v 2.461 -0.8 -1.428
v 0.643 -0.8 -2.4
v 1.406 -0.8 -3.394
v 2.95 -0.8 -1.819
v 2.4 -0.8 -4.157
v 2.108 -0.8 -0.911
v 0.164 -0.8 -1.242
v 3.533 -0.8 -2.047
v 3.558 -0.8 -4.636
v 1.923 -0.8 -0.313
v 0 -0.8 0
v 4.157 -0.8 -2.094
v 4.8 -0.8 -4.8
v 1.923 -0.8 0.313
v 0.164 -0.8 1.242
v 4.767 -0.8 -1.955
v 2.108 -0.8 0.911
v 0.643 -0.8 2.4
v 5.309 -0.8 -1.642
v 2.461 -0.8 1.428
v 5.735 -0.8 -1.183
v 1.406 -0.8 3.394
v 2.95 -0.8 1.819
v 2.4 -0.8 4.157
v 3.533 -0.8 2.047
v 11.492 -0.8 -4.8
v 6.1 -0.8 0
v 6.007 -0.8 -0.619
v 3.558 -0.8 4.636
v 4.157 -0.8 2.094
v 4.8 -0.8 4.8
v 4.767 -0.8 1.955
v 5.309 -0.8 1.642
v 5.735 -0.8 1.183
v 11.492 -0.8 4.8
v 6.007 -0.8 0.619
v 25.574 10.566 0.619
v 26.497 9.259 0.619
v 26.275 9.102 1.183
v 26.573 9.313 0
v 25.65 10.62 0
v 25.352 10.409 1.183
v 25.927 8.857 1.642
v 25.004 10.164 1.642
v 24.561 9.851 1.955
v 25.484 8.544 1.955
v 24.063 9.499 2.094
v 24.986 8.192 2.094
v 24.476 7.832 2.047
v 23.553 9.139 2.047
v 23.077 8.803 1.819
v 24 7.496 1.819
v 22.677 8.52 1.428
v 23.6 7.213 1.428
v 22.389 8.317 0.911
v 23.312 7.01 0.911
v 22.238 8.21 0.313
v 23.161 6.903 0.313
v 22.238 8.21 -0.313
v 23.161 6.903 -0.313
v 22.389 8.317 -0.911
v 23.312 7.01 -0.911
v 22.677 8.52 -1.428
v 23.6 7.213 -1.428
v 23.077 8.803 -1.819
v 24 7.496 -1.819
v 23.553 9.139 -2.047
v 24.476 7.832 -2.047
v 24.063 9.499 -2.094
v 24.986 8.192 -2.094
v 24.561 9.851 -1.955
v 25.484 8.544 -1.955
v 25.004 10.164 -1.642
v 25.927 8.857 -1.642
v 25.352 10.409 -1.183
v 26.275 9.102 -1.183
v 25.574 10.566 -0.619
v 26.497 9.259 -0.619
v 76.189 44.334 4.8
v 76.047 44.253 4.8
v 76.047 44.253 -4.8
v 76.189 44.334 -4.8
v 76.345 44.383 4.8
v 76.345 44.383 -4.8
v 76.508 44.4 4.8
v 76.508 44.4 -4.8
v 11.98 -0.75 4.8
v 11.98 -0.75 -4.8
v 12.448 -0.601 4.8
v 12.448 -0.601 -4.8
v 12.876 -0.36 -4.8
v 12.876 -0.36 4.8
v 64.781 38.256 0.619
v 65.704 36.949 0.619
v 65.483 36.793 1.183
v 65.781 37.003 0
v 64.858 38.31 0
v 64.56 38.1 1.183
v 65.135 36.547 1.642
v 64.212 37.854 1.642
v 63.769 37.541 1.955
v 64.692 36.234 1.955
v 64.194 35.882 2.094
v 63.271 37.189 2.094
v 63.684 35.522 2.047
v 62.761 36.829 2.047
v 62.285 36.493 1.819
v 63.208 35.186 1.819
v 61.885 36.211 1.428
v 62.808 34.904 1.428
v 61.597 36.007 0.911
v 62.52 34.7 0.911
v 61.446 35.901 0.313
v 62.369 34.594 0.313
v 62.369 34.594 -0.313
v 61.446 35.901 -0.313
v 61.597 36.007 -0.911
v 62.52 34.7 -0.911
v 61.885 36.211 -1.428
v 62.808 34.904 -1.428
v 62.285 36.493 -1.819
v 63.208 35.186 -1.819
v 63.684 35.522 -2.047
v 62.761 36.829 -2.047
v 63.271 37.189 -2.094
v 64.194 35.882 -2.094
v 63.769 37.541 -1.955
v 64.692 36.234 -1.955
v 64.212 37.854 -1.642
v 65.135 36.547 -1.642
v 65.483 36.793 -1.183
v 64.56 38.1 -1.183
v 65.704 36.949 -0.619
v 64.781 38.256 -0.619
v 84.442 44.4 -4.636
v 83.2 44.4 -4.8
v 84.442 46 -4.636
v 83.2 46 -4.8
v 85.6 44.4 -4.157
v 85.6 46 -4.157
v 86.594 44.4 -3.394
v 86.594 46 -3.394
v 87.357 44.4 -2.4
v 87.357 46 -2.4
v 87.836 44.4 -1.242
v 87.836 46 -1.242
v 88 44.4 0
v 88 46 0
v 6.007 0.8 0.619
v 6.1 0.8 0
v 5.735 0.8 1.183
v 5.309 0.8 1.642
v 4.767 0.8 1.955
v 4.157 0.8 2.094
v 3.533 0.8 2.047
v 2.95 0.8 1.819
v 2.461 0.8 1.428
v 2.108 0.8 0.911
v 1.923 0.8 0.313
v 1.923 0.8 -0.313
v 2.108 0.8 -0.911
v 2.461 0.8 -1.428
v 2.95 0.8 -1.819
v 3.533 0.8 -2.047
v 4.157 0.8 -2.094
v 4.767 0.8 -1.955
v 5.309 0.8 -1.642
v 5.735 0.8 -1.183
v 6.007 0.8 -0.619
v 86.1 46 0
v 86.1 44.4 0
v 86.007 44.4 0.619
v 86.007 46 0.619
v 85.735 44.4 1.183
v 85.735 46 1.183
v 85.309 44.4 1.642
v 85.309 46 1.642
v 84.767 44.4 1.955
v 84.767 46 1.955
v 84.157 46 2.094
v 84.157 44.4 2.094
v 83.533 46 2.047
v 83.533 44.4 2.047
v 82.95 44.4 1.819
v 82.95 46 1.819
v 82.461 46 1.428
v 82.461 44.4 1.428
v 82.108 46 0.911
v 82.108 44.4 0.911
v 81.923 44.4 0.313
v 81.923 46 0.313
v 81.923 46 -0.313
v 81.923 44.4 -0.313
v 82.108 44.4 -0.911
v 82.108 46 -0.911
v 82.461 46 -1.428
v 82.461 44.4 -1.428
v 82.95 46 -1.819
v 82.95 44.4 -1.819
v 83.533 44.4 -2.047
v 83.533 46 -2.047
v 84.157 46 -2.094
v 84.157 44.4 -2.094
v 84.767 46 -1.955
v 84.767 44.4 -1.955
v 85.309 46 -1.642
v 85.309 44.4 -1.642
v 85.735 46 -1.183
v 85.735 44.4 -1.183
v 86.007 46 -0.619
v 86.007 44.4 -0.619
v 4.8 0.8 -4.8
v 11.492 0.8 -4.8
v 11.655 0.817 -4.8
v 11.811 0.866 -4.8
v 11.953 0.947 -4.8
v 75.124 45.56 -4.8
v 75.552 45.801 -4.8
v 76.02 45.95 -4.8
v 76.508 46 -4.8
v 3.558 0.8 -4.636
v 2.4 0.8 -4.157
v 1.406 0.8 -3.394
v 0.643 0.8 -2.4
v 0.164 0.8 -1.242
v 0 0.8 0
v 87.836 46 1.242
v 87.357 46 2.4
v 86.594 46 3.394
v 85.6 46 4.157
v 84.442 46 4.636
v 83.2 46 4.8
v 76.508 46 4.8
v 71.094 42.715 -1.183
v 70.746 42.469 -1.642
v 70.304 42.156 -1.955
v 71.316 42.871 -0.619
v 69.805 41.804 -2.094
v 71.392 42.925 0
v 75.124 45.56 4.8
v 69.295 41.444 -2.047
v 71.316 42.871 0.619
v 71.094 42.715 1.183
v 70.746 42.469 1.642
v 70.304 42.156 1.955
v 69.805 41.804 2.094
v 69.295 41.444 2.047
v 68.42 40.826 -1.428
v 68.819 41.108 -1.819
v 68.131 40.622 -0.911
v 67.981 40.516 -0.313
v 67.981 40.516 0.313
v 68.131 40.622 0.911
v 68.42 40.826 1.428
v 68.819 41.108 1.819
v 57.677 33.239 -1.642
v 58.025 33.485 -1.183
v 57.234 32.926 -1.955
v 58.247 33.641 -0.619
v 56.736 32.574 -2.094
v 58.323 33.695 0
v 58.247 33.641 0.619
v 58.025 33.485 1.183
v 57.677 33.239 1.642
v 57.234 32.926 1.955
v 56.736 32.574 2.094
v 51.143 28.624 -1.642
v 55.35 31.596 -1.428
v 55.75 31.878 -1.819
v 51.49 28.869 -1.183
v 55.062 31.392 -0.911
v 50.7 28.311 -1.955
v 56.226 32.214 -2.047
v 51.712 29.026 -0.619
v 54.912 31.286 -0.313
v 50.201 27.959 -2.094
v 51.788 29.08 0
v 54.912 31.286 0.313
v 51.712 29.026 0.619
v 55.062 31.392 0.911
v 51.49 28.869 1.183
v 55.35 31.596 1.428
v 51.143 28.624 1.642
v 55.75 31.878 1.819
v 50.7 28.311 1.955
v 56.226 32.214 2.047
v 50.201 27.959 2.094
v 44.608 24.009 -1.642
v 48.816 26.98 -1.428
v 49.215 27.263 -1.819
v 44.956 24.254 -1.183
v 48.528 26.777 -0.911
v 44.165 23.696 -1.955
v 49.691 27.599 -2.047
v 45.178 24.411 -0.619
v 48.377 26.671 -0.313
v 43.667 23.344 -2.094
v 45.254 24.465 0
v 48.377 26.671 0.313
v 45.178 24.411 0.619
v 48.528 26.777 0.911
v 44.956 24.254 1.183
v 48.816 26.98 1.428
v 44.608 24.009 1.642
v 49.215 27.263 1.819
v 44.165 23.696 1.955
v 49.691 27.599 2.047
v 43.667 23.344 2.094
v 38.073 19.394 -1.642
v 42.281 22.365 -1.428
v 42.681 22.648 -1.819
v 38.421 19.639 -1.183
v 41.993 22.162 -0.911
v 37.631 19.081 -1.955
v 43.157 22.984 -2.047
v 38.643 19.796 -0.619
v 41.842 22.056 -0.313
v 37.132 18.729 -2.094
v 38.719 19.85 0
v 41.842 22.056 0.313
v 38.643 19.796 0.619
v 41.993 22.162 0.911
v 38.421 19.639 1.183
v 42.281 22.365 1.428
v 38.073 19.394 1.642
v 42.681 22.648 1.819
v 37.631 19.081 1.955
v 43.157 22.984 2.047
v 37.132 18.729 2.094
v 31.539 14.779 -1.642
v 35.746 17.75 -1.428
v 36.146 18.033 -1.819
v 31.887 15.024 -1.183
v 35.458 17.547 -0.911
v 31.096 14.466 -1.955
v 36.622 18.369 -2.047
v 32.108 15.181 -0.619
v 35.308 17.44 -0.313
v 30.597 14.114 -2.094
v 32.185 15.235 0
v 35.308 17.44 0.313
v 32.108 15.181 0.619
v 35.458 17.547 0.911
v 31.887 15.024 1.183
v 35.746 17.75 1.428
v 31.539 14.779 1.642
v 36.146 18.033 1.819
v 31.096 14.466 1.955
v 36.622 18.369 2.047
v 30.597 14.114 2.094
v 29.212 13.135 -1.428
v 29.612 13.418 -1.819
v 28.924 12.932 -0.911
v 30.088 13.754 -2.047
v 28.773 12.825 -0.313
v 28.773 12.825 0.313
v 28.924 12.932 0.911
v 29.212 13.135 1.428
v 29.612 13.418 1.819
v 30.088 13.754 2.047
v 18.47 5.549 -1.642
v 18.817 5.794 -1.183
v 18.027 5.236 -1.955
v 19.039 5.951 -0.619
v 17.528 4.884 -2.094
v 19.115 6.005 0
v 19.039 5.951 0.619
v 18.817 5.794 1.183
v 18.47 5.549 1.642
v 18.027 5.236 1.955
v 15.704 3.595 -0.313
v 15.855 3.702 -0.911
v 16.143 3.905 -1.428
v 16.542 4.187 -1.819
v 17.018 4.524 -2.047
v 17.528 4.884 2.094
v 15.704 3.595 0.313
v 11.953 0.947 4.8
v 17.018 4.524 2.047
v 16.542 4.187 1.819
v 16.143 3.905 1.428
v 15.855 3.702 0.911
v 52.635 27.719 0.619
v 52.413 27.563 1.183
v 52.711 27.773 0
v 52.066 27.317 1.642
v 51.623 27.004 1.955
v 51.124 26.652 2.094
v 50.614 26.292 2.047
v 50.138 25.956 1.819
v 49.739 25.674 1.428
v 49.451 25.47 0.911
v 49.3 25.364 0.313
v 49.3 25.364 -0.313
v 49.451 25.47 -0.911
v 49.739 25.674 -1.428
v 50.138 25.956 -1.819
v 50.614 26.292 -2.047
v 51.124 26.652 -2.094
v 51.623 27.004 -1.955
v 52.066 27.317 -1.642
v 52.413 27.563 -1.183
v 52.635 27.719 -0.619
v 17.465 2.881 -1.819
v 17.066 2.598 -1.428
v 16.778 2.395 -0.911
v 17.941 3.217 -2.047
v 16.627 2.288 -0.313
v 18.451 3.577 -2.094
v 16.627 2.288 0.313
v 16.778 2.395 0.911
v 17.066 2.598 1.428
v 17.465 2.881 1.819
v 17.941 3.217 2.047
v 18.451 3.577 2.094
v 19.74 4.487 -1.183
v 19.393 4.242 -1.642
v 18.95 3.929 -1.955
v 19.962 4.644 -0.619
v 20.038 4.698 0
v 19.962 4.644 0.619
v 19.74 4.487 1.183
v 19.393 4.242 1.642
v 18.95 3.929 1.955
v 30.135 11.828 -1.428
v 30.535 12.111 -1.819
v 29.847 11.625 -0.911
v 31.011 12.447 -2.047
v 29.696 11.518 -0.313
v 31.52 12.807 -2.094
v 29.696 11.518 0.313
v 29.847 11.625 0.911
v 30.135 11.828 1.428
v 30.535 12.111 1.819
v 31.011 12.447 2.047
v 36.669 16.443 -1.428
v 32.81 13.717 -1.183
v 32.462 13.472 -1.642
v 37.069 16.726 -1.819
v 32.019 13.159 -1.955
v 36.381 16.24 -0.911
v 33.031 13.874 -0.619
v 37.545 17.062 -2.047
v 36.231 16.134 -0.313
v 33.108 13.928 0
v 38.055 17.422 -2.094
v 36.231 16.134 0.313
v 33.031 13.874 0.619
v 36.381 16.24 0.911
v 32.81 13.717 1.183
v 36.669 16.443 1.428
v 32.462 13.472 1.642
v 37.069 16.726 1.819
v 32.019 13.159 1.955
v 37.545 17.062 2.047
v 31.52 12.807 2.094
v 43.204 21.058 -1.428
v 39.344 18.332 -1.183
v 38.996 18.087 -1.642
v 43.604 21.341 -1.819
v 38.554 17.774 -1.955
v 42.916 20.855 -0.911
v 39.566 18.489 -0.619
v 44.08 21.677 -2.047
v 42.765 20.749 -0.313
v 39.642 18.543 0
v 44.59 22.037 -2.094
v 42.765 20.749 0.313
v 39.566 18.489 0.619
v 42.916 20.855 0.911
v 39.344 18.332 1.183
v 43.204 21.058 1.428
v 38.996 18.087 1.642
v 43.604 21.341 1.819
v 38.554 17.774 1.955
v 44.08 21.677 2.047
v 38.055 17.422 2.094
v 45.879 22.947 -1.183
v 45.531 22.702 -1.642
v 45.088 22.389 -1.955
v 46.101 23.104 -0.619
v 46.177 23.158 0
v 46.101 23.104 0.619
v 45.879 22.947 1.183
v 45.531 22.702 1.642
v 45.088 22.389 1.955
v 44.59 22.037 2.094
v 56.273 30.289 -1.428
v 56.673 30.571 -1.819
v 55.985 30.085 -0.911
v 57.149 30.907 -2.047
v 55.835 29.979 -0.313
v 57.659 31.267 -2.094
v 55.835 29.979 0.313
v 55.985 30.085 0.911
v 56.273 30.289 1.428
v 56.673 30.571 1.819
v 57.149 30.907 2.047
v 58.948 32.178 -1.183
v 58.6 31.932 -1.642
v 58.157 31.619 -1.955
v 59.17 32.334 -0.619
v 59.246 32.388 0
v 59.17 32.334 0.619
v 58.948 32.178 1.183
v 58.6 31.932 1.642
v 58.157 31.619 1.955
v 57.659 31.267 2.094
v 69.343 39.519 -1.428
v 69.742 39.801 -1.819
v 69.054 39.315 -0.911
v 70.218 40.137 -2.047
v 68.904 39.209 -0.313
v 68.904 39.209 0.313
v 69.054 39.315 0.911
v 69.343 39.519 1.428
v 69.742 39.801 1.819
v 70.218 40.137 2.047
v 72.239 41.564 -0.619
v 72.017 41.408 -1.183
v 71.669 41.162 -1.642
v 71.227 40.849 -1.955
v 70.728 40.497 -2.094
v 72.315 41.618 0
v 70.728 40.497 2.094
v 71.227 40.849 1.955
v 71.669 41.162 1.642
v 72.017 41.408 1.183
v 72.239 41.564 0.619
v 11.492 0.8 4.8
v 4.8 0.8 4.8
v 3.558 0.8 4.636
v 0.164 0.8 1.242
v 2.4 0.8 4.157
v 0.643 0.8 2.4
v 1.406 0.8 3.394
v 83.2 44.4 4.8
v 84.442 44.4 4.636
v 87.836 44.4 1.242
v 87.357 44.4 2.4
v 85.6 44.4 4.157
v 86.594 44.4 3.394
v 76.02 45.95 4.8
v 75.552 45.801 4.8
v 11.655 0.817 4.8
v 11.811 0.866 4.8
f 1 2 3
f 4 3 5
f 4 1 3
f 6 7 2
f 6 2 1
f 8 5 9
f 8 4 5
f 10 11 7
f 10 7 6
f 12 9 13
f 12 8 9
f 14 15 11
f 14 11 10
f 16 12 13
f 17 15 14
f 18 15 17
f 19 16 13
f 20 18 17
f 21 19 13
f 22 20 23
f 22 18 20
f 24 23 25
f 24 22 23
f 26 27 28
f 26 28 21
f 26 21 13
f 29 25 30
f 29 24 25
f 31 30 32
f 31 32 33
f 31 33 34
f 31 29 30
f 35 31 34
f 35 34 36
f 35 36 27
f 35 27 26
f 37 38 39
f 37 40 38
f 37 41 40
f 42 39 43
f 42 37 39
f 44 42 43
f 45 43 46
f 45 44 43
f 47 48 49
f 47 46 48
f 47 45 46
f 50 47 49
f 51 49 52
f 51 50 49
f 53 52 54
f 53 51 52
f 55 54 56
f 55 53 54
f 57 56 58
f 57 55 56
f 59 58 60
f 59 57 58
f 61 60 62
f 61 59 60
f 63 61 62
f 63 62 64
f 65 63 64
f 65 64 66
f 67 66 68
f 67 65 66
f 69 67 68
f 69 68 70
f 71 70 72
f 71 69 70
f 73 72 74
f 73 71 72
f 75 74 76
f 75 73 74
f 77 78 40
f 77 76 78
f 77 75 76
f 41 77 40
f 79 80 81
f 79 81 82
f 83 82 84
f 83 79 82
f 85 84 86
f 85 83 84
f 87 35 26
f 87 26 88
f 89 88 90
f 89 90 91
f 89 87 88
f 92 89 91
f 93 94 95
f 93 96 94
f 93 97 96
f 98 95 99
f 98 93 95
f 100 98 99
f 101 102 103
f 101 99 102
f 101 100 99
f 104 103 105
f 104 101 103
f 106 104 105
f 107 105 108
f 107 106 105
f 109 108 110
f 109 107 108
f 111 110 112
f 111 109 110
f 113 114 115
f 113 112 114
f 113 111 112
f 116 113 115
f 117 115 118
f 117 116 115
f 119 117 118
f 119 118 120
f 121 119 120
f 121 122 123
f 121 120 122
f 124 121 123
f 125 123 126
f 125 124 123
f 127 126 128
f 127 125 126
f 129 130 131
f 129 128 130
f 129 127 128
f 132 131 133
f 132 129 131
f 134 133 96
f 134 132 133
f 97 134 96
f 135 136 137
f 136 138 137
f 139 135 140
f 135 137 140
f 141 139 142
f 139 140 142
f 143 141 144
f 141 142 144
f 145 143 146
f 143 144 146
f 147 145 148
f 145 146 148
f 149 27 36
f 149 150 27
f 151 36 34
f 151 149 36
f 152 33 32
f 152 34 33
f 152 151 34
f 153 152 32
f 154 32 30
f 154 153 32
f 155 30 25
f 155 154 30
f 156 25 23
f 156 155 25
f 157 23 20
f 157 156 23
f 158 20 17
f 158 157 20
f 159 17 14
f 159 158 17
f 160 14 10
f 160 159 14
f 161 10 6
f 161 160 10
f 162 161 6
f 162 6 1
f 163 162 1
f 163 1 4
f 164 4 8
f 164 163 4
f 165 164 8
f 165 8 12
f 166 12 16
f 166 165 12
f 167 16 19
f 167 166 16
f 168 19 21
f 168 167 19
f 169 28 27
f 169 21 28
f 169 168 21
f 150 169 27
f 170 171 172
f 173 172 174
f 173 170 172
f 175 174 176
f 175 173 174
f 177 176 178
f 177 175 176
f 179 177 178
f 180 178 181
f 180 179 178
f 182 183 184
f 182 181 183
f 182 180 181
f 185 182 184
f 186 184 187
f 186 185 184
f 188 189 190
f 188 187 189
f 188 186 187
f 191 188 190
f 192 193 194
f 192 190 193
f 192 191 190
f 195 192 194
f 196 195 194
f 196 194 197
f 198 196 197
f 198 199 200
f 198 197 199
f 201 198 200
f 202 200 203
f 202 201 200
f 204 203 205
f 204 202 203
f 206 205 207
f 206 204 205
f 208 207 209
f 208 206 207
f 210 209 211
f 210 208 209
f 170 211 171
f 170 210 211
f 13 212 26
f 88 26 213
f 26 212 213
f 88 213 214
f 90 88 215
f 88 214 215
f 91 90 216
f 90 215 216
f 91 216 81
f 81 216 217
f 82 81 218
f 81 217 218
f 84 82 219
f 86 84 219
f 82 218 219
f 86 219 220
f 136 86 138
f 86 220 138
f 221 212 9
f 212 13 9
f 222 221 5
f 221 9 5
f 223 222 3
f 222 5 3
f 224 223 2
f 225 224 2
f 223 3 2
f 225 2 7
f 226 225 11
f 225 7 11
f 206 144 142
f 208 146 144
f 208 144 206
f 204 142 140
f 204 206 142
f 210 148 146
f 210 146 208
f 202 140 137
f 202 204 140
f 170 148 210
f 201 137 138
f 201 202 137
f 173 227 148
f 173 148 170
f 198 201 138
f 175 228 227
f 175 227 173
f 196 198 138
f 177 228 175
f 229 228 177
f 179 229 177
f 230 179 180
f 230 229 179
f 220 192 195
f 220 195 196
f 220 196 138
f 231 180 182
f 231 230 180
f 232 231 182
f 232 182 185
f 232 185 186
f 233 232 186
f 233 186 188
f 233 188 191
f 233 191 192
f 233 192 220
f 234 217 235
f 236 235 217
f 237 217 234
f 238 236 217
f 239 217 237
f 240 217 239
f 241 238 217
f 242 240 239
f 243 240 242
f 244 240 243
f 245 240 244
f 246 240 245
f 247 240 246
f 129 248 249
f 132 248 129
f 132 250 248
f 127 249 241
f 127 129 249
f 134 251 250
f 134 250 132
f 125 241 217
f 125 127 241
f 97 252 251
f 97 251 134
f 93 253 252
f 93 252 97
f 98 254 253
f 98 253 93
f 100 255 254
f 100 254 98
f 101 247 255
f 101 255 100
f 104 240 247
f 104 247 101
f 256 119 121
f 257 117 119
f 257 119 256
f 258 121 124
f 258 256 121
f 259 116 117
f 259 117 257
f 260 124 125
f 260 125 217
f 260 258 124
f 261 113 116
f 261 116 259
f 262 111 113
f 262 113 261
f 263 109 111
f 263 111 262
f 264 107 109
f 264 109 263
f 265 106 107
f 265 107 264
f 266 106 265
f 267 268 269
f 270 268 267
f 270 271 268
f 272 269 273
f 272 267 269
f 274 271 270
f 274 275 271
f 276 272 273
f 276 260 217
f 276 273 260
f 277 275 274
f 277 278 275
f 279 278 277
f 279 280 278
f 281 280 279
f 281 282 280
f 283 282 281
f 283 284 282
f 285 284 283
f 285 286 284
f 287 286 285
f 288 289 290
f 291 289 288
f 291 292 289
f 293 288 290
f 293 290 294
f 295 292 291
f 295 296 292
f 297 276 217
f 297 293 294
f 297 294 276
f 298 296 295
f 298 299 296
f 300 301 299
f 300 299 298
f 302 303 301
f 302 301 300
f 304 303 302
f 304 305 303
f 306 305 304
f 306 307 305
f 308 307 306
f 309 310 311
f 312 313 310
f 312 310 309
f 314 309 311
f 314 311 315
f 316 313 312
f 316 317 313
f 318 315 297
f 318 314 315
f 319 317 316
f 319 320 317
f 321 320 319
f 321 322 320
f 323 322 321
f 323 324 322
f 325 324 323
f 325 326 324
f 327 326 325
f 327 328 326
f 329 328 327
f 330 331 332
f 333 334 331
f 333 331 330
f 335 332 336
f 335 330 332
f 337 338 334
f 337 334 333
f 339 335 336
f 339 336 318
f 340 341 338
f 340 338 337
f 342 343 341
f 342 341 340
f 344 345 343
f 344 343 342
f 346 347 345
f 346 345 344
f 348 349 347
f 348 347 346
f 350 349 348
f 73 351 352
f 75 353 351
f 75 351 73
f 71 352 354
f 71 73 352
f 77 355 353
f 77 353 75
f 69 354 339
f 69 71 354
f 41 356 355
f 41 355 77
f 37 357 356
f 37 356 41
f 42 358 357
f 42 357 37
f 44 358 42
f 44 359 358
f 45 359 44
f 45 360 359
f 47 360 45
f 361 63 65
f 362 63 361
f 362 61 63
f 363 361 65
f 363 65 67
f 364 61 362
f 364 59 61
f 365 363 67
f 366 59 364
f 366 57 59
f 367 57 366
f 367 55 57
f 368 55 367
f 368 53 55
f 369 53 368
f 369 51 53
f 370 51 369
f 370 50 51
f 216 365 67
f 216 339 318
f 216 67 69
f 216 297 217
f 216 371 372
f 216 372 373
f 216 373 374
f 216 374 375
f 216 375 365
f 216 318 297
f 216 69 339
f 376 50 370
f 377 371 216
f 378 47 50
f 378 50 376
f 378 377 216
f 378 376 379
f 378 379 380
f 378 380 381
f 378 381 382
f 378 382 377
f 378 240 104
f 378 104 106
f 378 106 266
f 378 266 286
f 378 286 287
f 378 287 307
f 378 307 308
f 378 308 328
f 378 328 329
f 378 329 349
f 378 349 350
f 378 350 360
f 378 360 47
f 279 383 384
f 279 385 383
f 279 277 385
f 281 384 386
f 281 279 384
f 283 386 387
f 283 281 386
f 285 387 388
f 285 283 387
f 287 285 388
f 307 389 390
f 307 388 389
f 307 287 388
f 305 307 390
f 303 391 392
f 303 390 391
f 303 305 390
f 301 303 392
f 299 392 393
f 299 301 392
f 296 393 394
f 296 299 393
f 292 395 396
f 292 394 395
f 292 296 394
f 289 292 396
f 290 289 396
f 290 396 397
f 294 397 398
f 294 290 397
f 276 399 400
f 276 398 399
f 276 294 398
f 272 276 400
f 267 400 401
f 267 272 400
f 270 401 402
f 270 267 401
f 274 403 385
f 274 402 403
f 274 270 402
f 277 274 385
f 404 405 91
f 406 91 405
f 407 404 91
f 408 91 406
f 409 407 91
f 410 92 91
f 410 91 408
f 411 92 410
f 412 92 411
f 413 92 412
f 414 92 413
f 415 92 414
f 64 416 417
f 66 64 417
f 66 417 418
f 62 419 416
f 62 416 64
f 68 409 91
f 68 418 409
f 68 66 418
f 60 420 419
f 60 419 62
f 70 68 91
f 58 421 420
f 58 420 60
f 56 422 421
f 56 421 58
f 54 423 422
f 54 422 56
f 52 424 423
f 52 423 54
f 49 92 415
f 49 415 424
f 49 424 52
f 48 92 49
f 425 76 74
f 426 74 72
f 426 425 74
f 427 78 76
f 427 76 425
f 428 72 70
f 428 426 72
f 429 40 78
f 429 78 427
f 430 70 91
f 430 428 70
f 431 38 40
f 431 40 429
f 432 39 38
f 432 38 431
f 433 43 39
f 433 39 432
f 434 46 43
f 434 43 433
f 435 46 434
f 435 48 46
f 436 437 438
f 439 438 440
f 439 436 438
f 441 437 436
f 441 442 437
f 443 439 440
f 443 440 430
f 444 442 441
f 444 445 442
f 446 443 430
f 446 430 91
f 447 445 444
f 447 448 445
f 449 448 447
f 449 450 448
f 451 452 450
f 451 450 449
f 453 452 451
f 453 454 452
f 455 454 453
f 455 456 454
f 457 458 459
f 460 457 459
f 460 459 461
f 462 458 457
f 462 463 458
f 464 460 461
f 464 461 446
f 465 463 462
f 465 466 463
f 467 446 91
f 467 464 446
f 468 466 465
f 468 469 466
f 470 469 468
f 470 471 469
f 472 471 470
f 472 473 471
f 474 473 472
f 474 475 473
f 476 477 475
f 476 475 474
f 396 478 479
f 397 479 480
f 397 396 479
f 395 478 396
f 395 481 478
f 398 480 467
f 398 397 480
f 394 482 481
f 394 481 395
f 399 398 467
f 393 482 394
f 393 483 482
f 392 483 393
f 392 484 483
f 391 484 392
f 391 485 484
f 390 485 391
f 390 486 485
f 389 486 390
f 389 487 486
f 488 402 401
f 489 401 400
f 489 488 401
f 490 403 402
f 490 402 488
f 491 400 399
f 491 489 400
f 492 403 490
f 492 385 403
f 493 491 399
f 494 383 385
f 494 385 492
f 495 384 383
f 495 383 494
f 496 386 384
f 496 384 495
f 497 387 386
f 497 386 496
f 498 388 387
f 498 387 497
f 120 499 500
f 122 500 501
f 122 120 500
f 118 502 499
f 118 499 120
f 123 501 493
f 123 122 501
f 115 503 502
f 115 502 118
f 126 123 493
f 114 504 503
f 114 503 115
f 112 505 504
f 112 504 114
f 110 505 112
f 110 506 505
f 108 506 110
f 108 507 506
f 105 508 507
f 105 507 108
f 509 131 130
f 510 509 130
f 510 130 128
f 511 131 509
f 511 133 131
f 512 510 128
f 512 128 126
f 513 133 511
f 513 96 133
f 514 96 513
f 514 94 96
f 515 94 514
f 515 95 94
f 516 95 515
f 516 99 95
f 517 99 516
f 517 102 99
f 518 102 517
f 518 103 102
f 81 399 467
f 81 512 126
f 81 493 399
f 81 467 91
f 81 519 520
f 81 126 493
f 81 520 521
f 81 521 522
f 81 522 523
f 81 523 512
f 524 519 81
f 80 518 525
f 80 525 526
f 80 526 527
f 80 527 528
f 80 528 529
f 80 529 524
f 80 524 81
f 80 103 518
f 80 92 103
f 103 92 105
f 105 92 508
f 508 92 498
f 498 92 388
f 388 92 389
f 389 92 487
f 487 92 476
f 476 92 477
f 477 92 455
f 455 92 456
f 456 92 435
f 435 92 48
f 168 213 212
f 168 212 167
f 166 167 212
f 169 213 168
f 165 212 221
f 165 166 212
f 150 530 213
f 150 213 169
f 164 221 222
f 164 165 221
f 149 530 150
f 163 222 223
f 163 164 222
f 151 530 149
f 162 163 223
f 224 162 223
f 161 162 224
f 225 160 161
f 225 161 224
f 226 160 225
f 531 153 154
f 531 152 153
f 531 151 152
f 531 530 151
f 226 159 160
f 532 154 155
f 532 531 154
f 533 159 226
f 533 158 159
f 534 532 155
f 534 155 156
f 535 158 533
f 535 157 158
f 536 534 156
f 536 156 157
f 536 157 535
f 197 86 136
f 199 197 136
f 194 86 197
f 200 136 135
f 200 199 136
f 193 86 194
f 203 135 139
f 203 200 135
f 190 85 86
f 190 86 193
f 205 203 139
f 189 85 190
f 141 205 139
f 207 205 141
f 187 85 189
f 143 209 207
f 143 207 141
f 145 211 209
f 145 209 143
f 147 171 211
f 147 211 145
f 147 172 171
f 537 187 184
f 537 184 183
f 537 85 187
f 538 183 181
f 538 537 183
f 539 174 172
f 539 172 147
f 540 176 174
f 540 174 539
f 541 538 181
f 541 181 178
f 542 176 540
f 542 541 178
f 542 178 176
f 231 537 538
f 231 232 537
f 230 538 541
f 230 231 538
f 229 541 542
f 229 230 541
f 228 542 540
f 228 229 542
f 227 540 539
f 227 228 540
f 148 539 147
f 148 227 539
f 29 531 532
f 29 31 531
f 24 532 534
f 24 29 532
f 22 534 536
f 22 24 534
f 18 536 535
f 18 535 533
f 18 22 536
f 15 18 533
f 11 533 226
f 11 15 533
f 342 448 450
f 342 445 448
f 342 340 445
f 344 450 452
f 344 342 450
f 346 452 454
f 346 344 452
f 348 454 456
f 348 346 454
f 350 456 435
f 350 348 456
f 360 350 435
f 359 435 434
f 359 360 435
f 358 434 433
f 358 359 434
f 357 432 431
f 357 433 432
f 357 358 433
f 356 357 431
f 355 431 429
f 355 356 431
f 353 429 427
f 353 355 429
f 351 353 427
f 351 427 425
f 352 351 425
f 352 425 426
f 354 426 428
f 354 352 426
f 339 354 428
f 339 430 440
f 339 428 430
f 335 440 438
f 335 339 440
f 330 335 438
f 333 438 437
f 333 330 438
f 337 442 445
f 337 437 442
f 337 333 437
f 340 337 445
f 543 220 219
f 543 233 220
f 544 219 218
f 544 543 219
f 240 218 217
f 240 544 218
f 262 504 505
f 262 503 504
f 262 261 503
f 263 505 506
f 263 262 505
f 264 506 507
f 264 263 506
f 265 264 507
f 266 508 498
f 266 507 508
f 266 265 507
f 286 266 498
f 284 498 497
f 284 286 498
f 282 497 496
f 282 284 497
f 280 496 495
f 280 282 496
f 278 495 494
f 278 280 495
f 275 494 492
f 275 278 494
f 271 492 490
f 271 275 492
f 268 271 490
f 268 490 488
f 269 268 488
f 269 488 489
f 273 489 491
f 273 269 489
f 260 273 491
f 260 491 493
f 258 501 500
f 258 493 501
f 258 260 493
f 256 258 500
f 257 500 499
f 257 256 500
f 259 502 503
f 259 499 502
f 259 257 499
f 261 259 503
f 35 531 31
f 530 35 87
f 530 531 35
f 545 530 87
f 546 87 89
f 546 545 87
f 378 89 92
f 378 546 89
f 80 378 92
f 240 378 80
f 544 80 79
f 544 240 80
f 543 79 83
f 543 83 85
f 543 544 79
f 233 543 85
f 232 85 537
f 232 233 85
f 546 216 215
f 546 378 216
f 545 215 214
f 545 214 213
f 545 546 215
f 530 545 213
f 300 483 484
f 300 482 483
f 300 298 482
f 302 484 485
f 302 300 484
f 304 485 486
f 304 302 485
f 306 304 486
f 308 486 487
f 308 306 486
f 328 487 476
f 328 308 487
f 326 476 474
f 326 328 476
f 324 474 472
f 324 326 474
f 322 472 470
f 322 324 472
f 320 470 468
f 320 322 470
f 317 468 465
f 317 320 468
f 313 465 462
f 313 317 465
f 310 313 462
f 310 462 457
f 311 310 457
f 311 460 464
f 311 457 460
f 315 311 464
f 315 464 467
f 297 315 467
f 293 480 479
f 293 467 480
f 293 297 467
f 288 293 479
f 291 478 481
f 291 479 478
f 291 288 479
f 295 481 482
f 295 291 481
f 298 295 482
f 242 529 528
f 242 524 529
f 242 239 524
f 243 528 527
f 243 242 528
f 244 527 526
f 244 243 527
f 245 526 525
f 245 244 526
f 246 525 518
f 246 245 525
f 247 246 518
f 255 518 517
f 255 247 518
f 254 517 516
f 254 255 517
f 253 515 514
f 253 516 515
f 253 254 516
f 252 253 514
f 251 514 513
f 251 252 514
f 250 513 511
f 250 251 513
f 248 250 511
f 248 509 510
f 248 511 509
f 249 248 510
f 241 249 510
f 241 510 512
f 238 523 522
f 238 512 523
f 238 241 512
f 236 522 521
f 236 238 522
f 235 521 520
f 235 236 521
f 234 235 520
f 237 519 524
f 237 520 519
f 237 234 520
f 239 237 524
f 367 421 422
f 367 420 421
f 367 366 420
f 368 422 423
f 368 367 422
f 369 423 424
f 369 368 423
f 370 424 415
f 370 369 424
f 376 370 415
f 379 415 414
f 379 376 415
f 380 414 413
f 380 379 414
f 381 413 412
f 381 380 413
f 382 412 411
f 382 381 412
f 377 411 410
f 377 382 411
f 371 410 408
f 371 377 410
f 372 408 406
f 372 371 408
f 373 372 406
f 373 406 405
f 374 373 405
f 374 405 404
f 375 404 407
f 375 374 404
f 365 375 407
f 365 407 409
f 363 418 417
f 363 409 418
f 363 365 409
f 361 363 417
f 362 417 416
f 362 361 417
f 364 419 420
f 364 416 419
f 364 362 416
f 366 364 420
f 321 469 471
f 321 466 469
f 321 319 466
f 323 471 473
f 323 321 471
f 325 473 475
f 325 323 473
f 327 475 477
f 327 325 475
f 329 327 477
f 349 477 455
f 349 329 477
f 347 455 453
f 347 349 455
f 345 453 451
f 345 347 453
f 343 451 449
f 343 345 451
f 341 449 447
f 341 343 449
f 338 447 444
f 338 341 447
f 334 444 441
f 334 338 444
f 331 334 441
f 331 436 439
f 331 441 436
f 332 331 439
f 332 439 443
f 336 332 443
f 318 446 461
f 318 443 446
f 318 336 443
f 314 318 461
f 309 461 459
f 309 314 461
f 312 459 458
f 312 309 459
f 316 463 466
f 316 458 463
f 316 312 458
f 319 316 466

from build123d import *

# Parameters (mm, degrees)
EXTRUDE_THIN1_DEPTH = 4.8
SKETCH2_R           = 2.1
CUT_EXTRUDE1_DEPTH  = 100.04584797
SKETCH3_R           = 2.1
CUT_EXTRUDE2_DEPTH  = 100.786171387
FILLET1_R           = 4.8
SKETCH4_R           = 2.1
CUT_EXTRUDE3_DEPTH  = 99.787603571
LPATTERN1_COUNT     = 5
LPATTERN1_PITCH     = 8
LPATTERN2_COUNT     = 5
LPATTERN2_PITCH     = 8


with BuildPart() as part:
    # Sketch1 → Extrude-Thin1 (new body)
    with BuildSketch(Plane.XY):
        with BuildLine():
            Line((0, -0.8), (11.491963677, -0.8))
            ThreePointArc((11.491963677, -0.8), (12.218283231, -0.687457083), (12.87648435, -0.360383255))
            Line((12.87648435, -0.360383255), (76.046529432, 44.253461085))
            ThreePointArc((76.046529432, 44.253461085), (76.265929805, 44.362485694), (76.508036323, 44.4))
            Line((76.508036323, 44.4), (88, 44.4))
            Line((88, 44.4), (88, 46))
            Line((88, 46), (76.508036323, 46))
            ThreePointArc((76.508036323, 46), (75.781716769, 45.887457083), (75.12351565, 45.560383255))
            Line((75.12351565, 45.560383255), (11.953470568, 0.946538915))
            ThreePointArc((11.953470568, 0.946538915), (11.734070195, 0.837514306), (11.491963677, 0.8))
            Line((11.491963677, 0.8), (0, 0.8))
            Line((0, 0.8), (0, -0.8))
        make_face()
    extrude(amount=EXTRUDE_THIN1_DEPTH)

    # Sketch2 → Cut-Extrude1 (cut, through all)
    with BuildSketch(Plane(origin=(0, 0.8, 0), x_dir=(1, 0, 0), z_dir=(0, 1, 0))):
        with Locations((4, 0)):
            Circle(SKETCH2_R)
    extrude(amount=-CUT_EXTRUDE1_DEPTH, mode=Mode.SUBTRACT)

    # Sketch3 → Cut-Extrude2 (cut, through all)
    with BuildSketch(Plane(origin=(0, 46, 0), x_dir=(1, 0, 0), z_dir=(0, 1, 0))):
        with Locations((84, 0)):
            Circle(SKETCH3_R)
    extrude(amount=-CUT_EXTRUDE2_DEPTH, mode=Mode.SUBTRACT)

    # Fillet1
    fillet1_edges = [part.edges().sort_by_distance(p)[0] for p in [
        (0, 0, 4.8),
        (88, 45.2, 4.8),
    ]]
    fillet(fillet1_edges, radius=FILLET1_R - 0.0001)  # a hair under: the kernel refuses the full size

    # Sketch4 → Cut-Extrude3 (cut, through all)
    with BuildSketch(Plane(origin=(3.532029558, -5.001103798, 0), x_dir=(0.816826356052519, 0.5768836139620918, 0), z_dir=(-0.5768836139620916, 0.8168263560525189, 0))):
        with Locations((48.977929342, 0)):
            Circle(SKETCH4_R)
    cut_extrude3 = extrude(amount=-CUT_EXTRUDE3_DEPTH, mode=Mode.SUBTRACT)

    # LPattern1: Cut-Extrude3 ×5
    with Locations(*[Vector(0.8168263560525189, 0.5768836139620918, 0) * (i * LPATTERN1_PITCH) for i in range(1, LPATTERN1_COUNT)]):
        add(cut_extrude3, mode=Mode.SUBTRACT)

    # LPattern2: Cut-Extrude3 ×5
    with Locations(*[Vector(-0.8168263560525189, -0.5768836139620918, 0) * (i * LPATTERN2_PITCH) for i in range(1, LPATTERN2_COUNT)]):
        add(cut_extrude3, mode=Mode.SUBTRACT)

    # Mirror1: part across plane


with BuildPart() as part_1:
    add(part.part)
    add(part.part.mirror(Plane(origin=(76.508036323, 43.6, 0), x_dir=(1, 0, 0), z_dir=(0, 0, 1))))


solid = part_1.part
